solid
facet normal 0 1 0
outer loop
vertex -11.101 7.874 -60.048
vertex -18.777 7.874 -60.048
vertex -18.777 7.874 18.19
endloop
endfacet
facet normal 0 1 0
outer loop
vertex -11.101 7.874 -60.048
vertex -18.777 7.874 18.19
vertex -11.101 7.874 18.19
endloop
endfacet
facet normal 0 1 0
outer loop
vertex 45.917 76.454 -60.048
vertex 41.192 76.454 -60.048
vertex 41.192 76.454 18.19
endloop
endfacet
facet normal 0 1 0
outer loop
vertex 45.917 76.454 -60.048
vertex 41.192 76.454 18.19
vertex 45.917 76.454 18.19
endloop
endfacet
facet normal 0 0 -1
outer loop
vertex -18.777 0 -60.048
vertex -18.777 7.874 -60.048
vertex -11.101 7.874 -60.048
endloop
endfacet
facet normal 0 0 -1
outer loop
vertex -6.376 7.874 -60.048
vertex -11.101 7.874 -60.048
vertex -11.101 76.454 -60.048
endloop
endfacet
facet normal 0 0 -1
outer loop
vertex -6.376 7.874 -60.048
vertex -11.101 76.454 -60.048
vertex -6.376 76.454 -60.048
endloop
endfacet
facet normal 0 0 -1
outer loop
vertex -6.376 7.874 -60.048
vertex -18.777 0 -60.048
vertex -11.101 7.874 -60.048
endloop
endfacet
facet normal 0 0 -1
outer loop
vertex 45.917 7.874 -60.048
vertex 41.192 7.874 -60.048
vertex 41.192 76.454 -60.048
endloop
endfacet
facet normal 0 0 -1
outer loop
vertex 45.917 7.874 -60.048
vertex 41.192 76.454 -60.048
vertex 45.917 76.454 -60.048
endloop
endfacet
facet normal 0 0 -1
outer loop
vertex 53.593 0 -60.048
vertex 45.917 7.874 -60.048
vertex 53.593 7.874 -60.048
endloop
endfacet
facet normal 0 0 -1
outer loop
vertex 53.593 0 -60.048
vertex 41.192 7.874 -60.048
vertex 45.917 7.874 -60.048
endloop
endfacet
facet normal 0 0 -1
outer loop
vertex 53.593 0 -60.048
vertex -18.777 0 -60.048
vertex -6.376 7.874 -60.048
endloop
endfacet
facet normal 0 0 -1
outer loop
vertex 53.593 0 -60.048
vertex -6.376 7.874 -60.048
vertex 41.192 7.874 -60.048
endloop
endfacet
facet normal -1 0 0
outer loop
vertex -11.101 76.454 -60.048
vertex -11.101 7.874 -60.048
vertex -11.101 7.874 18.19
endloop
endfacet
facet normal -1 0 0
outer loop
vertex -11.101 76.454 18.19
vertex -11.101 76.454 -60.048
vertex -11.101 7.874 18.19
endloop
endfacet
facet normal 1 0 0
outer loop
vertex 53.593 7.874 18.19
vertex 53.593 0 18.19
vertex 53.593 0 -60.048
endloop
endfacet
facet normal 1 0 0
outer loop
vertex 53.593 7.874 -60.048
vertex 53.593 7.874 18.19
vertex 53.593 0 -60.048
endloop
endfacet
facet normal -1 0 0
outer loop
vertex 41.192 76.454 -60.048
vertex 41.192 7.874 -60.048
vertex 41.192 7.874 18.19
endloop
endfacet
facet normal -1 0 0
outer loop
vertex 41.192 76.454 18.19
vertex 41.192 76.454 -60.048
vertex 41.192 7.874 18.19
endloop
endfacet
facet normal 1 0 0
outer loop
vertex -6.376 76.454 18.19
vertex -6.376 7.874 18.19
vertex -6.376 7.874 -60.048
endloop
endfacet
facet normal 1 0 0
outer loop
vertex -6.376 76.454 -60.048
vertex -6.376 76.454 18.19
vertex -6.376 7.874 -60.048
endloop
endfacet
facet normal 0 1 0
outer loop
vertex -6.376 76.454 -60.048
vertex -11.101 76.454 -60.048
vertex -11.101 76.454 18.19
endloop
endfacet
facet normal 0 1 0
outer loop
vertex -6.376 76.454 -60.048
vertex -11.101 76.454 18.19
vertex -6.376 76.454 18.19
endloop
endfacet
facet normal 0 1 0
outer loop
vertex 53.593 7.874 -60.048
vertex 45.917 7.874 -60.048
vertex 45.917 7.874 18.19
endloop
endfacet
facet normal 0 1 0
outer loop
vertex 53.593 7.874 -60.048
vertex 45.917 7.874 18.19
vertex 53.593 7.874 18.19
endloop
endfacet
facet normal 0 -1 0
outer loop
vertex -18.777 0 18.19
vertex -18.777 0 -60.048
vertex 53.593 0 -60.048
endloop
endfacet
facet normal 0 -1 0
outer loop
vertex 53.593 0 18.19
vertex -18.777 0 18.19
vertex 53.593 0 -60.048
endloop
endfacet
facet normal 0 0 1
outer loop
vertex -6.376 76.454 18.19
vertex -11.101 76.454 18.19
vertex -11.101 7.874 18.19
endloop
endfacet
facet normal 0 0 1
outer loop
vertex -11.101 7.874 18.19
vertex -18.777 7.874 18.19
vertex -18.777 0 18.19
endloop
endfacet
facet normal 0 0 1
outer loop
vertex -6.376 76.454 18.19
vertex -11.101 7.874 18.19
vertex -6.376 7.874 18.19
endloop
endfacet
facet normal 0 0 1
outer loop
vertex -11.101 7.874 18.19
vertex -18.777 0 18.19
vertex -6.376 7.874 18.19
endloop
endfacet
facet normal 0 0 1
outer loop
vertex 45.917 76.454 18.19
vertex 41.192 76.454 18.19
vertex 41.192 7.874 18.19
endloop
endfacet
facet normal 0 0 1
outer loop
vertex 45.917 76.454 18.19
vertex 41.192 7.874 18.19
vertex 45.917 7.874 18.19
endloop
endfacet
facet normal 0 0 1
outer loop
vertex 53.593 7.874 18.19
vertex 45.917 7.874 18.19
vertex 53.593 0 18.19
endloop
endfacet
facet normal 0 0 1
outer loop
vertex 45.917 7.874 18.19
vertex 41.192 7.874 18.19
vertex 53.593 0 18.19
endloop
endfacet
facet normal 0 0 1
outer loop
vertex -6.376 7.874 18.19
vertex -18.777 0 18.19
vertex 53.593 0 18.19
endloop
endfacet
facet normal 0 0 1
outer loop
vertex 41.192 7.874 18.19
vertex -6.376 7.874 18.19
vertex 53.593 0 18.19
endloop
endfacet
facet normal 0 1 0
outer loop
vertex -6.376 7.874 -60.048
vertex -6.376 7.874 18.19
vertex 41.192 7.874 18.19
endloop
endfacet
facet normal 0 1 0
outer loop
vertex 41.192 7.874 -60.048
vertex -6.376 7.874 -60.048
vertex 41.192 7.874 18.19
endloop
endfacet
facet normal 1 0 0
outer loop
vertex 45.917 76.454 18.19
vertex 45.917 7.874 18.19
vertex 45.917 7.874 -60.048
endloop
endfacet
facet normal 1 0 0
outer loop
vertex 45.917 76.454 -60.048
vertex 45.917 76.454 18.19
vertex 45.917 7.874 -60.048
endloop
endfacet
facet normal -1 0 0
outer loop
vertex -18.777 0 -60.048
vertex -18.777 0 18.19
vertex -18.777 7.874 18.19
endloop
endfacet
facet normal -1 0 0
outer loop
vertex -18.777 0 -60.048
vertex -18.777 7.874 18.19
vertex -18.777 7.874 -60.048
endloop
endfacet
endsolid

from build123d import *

# Parameters (mm, degrees)
SKETCH1_W           = 72.370080969
SKETCH1_H           = 78.237925372
BOSS_EXTRUDE1_DEPTH = 7.874
BOSS_EXTRUDE3_DEPTH = 68.58


with BuildPart() as part:
    # Sketch1 → Boss-Extrude1 (new body)
    with BuildSketch(Plane(origin=(0, 0, 0), x_dir=(1, 0, 0), z_dir=(0, 1, 0))):
        with Locations((17.407938396, 20.928645037)):
            Rectangle(SKETCH1_W, SKETCH1_H)
    extrude(amount=BOSS_EXTRUDE1_DEPTH)

    # Sketch2 → Boss-Extrude3 (add)
    with BuildSketch(Plane(origin=(0, 7.874, 0), x_dir=(1, 0, 0), z_dir=(0, 1, 0))):
        Polygon((41.192023567, 60.047607723), (41.192023567, 20.928645037), (41.192023567, -18.190317649), (45.917338502, -18.190317649), (45.917338502, 60.047607723), align=None)
        Polygon((-6.376146777, -18.190317649), (-6.376146777, 20.928645037), (-6.376146777, 60.047607723), (-11.101461711, 60.047607723), (-11.101461711, -18.190317649), align=None)
    extrude(amount=BOSS_EXTRUDE3_DEPTH)


solid = part.part
